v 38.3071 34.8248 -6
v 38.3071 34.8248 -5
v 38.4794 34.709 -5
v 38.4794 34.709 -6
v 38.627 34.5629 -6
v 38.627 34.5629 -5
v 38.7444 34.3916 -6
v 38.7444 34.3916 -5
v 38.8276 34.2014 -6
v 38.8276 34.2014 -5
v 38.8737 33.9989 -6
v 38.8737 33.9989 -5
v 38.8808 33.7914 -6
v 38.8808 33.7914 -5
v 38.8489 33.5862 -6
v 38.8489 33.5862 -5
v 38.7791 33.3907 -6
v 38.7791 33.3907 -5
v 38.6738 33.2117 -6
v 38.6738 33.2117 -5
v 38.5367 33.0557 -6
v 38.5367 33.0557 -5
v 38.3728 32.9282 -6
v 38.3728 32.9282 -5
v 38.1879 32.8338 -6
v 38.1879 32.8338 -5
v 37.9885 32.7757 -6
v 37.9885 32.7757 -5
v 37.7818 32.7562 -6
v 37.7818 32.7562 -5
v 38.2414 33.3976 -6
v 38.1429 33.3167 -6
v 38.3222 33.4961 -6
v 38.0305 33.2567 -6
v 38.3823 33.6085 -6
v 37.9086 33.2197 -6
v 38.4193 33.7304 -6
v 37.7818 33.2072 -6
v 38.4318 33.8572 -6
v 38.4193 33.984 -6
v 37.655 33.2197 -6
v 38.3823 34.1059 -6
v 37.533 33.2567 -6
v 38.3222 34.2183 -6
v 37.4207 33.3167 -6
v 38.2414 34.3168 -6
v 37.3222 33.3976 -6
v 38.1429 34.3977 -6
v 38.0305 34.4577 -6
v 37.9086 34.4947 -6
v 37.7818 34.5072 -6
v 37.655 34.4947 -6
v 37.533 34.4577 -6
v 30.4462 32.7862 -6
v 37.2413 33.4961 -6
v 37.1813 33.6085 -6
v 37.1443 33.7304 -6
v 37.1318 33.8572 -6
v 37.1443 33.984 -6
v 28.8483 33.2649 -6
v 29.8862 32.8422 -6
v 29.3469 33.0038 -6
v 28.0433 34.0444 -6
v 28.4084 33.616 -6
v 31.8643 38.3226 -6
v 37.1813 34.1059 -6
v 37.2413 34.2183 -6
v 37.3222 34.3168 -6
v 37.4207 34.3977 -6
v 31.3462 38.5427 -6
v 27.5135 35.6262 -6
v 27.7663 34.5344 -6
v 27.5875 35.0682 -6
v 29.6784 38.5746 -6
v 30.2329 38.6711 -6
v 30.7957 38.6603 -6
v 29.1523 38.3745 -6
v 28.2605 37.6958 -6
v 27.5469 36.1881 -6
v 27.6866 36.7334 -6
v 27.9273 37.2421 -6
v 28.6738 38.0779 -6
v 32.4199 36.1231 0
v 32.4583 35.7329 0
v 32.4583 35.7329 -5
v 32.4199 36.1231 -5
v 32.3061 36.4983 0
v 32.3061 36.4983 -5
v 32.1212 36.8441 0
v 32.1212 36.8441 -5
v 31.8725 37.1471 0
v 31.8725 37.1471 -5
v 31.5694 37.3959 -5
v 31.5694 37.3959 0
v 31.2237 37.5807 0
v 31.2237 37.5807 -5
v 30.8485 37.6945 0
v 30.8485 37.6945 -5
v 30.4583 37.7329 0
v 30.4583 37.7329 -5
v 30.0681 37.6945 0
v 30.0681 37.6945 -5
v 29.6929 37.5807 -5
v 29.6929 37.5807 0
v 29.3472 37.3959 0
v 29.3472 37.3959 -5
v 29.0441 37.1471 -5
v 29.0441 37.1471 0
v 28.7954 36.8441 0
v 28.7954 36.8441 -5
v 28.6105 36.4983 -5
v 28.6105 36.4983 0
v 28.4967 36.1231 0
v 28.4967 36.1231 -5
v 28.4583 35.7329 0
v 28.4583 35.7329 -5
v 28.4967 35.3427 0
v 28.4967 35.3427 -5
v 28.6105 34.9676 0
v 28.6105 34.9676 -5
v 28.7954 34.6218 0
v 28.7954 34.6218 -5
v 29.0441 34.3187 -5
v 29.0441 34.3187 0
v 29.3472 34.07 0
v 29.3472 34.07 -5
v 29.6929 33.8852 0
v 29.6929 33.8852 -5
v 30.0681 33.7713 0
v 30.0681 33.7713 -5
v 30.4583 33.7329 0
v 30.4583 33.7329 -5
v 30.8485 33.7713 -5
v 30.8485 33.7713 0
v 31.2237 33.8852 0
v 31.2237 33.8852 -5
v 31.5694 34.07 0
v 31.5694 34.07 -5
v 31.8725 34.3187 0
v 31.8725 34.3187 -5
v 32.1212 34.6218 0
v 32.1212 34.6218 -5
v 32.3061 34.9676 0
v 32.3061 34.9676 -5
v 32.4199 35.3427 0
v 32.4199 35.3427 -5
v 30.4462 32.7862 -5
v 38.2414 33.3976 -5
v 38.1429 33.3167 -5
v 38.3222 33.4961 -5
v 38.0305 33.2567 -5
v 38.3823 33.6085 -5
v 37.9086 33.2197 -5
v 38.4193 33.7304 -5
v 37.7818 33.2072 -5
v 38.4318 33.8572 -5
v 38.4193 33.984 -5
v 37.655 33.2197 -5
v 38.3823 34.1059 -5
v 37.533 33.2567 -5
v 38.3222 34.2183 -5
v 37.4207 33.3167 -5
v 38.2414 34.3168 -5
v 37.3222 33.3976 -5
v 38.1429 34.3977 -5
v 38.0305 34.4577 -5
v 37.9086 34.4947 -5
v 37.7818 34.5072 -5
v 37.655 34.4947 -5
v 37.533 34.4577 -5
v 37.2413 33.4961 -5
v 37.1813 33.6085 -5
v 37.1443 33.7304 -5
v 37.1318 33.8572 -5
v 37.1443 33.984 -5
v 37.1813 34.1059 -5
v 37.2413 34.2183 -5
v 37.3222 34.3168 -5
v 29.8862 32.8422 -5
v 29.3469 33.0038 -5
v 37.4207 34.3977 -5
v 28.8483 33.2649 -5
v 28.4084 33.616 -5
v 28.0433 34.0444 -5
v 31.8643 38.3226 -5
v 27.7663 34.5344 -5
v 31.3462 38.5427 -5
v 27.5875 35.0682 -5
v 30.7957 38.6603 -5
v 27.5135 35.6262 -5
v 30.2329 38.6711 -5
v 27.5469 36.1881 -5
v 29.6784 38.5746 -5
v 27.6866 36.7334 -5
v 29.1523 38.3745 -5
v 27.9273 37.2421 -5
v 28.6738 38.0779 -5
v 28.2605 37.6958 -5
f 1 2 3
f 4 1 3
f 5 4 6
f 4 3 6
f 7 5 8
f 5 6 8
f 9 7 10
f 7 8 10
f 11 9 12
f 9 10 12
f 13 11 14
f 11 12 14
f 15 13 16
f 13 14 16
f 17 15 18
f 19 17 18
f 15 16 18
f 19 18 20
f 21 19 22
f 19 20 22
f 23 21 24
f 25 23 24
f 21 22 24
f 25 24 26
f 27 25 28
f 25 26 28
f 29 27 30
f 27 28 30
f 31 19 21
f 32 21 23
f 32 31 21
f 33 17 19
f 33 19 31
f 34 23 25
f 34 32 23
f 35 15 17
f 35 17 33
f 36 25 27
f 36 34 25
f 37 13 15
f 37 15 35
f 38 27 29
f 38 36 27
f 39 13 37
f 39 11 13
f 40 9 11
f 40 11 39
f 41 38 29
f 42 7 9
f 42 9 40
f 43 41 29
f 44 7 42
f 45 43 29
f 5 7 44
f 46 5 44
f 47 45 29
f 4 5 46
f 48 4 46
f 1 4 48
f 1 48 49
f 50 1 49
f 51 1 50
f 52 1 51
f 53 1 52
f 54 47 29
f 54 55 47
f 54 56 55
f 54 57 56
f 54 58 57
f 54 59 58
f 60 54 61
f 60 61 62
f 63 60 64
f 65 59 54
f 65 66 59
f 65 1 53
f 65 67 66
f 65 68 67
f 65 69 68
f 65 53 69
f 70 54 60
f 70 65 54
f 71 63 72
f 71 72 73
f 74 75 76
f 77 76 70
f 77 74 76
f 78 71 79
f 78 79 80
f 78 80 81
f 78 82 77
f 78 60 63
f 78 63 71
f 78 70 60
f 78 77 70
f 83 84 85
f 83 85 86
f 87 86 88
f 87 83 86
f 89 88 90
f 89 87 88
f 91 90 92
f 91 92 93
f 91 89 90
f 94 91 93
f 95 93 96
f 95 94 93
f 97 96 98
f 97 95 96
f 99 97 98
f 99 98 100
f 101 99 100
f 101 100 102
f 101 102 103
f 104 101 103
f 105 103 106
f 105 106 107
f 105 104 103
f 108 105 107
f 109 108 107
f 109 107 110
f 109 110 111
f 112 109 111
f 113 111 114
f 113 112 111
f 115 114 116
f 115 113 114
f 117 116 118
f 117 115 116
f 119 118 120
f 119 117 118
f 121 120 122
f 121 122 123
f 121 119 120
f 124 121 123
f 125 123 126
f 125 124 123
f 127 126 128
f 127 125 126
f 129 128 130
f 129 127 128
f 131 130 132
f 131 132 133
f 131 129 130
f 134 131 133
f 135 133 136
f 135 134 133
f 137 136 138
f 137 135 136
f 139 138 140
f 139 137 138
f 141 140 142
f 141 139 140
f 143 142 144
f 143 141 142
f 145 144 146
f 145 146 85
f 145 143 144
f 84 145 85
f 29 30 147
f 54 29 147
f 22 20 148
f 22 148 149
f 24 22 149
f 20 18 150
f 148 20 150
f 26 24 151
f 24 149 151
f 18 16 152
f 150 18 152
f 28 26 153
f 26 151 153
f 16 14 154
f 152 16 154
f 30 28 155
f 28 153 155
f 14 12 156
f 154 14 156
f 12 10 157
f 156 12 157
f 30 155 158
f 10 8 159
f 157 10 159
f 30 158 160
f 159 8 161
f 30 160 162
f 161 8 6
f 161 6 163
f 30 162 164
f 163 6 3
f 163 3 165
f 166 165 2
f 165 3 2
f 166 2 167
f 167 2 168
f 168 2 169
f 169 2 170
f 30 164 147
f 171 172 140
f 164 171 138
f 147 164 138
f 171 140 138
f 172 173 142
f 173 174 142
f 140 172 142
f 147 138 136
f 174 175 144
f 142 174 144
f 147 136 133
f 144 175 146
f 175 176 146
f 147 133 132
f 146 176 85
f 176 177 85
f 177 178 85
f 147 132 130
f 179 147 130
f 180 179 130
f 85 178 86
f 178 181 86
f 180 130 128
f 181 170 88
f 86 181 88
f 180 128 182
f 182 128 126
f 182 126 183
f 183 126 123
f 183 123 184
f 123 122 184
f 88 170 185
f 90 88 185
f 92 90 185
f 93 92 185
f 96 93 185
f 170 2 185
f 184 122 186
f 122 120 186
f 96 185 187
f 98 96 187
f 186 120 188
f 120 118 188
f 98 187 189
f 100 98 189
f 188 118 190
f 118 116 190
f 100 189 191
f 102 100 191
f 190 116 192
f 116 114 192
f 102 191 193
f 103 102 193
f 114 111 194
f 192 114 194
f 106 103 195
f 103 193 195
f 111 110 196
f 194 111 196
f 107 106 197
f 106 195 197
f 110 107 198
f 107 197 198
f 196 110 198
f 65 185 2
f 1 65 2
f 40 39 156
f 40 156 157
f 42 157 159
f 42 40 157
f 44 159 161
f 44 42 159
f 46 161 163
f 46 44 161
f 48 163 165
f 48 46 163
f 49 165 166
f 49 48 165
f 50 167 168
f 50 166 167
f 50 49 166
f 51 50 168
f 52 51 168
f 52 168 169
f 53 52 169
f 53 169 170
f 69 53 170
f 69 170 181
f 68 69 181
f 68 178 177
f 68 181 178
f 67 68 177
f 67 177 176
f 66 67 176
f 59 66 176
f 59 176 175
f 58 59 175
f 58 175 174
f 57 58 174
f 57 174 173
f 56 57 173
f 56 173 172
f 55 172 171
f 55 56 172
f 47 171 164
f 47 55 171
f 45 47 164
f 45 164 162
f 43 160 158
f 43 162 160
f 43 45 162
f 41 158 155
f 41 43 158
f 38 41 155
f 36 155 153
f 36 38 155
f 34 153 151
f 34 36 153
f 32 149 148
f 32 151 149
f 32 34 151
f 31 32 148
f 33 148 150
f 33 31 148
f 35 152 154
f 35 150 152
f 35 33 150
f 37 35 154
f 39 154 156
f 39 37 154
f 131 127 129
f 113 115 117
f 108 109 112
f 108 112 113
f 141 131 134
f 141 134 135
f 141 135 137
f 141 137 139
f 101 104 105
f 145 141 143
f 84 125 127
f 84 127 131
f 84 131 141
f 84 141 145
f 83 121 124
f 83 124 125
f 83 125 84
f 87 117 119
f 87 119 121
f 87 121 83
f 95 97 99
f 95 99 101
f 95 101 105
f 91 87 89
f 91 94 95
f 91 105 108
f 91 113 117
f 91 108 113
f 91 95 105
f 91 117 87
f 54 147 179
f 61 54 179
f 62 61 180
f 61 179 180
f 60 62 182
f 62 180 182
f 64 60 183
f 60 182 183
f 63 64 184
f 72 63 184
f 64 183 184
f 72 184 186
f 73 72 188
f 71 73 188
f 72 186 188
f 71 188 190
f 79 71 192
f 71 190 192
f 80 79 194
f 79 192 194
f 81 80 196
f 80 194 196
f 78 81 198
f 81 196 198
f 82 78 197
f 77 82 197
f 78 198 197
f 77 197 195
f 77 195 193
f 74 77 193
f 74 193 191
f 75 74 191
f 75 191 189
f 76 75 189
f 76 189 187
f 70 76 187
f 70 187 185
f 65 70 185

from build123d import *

# Parameters (mm, degrees)
SKETCH1_R               = 2
BOSS_EXTRUDE1_DEPTH     = 5
BOSS_EXTRUDE2_DEPTH     = 1
CUT_EXTRUDE1_DEPTH      = 56.072597377
CUT_EXTRUDE1_DEPTH_BACK = 56.072597377
SKETCH3_R               = 0.65


# Read off the part's stored shape, not the designer's step: Boss-Extrude2
with BuildPart() as part:
    # Sketch1 → Boss-Extrude1 (new body)
    with BuildSketch(Plane.XY):
        with Locations((30.458296942, 35.732918139)):
            Circle(SKETCH1_R)
    extrude(amount=-BOSS_EXTRUDE1_DEPTH)

    # Boss-Extrude2 outline → Boss-Extrude2 (add)
    with BuildSketch(Plane(origin=(0, 0, -5), x_dir=(-1, 0, 0), z_dir=(0, 0, -1))):
        with BuildLine():
            ThreePointArc((-38.30710157, 34.824835399), (-38.848941129, 33.586198742), (-37.781773498, 32.756160115))
            Line((-37.781773498, 32.756160115), (-30.446238276, 32.786178641))
            ThreePointArc((-30.446238276, 32.786178641), (-27.603676035, 36.464053256), (-31.864257159, 38.32264688))
            Line((-31.864257159, 38.32264688), (-38.30710157, 34.824835399))
        make_face()
    extrude(amount=BOSS_EXTRUDE2_DEPTH)

    # Sketch3 → Cut-Extrude1 (cut, two sides: drawn at the far end of the back side and taken through both)
    with BuildSketch(Plane.XY.offset(-5).offset(-CUT_EXTRUDE1_DEPTH_BACK)):
        with Locations((37.781773498, 33.857199764)):
            Circle(SKETCH3_R)
    extrude(amount=CUT_EXTRUDE1_DEPTH + CUT_EXTRUDE1_DEPTH_BACK, mode=Mode.SUBTRACT)


solid = part.part
